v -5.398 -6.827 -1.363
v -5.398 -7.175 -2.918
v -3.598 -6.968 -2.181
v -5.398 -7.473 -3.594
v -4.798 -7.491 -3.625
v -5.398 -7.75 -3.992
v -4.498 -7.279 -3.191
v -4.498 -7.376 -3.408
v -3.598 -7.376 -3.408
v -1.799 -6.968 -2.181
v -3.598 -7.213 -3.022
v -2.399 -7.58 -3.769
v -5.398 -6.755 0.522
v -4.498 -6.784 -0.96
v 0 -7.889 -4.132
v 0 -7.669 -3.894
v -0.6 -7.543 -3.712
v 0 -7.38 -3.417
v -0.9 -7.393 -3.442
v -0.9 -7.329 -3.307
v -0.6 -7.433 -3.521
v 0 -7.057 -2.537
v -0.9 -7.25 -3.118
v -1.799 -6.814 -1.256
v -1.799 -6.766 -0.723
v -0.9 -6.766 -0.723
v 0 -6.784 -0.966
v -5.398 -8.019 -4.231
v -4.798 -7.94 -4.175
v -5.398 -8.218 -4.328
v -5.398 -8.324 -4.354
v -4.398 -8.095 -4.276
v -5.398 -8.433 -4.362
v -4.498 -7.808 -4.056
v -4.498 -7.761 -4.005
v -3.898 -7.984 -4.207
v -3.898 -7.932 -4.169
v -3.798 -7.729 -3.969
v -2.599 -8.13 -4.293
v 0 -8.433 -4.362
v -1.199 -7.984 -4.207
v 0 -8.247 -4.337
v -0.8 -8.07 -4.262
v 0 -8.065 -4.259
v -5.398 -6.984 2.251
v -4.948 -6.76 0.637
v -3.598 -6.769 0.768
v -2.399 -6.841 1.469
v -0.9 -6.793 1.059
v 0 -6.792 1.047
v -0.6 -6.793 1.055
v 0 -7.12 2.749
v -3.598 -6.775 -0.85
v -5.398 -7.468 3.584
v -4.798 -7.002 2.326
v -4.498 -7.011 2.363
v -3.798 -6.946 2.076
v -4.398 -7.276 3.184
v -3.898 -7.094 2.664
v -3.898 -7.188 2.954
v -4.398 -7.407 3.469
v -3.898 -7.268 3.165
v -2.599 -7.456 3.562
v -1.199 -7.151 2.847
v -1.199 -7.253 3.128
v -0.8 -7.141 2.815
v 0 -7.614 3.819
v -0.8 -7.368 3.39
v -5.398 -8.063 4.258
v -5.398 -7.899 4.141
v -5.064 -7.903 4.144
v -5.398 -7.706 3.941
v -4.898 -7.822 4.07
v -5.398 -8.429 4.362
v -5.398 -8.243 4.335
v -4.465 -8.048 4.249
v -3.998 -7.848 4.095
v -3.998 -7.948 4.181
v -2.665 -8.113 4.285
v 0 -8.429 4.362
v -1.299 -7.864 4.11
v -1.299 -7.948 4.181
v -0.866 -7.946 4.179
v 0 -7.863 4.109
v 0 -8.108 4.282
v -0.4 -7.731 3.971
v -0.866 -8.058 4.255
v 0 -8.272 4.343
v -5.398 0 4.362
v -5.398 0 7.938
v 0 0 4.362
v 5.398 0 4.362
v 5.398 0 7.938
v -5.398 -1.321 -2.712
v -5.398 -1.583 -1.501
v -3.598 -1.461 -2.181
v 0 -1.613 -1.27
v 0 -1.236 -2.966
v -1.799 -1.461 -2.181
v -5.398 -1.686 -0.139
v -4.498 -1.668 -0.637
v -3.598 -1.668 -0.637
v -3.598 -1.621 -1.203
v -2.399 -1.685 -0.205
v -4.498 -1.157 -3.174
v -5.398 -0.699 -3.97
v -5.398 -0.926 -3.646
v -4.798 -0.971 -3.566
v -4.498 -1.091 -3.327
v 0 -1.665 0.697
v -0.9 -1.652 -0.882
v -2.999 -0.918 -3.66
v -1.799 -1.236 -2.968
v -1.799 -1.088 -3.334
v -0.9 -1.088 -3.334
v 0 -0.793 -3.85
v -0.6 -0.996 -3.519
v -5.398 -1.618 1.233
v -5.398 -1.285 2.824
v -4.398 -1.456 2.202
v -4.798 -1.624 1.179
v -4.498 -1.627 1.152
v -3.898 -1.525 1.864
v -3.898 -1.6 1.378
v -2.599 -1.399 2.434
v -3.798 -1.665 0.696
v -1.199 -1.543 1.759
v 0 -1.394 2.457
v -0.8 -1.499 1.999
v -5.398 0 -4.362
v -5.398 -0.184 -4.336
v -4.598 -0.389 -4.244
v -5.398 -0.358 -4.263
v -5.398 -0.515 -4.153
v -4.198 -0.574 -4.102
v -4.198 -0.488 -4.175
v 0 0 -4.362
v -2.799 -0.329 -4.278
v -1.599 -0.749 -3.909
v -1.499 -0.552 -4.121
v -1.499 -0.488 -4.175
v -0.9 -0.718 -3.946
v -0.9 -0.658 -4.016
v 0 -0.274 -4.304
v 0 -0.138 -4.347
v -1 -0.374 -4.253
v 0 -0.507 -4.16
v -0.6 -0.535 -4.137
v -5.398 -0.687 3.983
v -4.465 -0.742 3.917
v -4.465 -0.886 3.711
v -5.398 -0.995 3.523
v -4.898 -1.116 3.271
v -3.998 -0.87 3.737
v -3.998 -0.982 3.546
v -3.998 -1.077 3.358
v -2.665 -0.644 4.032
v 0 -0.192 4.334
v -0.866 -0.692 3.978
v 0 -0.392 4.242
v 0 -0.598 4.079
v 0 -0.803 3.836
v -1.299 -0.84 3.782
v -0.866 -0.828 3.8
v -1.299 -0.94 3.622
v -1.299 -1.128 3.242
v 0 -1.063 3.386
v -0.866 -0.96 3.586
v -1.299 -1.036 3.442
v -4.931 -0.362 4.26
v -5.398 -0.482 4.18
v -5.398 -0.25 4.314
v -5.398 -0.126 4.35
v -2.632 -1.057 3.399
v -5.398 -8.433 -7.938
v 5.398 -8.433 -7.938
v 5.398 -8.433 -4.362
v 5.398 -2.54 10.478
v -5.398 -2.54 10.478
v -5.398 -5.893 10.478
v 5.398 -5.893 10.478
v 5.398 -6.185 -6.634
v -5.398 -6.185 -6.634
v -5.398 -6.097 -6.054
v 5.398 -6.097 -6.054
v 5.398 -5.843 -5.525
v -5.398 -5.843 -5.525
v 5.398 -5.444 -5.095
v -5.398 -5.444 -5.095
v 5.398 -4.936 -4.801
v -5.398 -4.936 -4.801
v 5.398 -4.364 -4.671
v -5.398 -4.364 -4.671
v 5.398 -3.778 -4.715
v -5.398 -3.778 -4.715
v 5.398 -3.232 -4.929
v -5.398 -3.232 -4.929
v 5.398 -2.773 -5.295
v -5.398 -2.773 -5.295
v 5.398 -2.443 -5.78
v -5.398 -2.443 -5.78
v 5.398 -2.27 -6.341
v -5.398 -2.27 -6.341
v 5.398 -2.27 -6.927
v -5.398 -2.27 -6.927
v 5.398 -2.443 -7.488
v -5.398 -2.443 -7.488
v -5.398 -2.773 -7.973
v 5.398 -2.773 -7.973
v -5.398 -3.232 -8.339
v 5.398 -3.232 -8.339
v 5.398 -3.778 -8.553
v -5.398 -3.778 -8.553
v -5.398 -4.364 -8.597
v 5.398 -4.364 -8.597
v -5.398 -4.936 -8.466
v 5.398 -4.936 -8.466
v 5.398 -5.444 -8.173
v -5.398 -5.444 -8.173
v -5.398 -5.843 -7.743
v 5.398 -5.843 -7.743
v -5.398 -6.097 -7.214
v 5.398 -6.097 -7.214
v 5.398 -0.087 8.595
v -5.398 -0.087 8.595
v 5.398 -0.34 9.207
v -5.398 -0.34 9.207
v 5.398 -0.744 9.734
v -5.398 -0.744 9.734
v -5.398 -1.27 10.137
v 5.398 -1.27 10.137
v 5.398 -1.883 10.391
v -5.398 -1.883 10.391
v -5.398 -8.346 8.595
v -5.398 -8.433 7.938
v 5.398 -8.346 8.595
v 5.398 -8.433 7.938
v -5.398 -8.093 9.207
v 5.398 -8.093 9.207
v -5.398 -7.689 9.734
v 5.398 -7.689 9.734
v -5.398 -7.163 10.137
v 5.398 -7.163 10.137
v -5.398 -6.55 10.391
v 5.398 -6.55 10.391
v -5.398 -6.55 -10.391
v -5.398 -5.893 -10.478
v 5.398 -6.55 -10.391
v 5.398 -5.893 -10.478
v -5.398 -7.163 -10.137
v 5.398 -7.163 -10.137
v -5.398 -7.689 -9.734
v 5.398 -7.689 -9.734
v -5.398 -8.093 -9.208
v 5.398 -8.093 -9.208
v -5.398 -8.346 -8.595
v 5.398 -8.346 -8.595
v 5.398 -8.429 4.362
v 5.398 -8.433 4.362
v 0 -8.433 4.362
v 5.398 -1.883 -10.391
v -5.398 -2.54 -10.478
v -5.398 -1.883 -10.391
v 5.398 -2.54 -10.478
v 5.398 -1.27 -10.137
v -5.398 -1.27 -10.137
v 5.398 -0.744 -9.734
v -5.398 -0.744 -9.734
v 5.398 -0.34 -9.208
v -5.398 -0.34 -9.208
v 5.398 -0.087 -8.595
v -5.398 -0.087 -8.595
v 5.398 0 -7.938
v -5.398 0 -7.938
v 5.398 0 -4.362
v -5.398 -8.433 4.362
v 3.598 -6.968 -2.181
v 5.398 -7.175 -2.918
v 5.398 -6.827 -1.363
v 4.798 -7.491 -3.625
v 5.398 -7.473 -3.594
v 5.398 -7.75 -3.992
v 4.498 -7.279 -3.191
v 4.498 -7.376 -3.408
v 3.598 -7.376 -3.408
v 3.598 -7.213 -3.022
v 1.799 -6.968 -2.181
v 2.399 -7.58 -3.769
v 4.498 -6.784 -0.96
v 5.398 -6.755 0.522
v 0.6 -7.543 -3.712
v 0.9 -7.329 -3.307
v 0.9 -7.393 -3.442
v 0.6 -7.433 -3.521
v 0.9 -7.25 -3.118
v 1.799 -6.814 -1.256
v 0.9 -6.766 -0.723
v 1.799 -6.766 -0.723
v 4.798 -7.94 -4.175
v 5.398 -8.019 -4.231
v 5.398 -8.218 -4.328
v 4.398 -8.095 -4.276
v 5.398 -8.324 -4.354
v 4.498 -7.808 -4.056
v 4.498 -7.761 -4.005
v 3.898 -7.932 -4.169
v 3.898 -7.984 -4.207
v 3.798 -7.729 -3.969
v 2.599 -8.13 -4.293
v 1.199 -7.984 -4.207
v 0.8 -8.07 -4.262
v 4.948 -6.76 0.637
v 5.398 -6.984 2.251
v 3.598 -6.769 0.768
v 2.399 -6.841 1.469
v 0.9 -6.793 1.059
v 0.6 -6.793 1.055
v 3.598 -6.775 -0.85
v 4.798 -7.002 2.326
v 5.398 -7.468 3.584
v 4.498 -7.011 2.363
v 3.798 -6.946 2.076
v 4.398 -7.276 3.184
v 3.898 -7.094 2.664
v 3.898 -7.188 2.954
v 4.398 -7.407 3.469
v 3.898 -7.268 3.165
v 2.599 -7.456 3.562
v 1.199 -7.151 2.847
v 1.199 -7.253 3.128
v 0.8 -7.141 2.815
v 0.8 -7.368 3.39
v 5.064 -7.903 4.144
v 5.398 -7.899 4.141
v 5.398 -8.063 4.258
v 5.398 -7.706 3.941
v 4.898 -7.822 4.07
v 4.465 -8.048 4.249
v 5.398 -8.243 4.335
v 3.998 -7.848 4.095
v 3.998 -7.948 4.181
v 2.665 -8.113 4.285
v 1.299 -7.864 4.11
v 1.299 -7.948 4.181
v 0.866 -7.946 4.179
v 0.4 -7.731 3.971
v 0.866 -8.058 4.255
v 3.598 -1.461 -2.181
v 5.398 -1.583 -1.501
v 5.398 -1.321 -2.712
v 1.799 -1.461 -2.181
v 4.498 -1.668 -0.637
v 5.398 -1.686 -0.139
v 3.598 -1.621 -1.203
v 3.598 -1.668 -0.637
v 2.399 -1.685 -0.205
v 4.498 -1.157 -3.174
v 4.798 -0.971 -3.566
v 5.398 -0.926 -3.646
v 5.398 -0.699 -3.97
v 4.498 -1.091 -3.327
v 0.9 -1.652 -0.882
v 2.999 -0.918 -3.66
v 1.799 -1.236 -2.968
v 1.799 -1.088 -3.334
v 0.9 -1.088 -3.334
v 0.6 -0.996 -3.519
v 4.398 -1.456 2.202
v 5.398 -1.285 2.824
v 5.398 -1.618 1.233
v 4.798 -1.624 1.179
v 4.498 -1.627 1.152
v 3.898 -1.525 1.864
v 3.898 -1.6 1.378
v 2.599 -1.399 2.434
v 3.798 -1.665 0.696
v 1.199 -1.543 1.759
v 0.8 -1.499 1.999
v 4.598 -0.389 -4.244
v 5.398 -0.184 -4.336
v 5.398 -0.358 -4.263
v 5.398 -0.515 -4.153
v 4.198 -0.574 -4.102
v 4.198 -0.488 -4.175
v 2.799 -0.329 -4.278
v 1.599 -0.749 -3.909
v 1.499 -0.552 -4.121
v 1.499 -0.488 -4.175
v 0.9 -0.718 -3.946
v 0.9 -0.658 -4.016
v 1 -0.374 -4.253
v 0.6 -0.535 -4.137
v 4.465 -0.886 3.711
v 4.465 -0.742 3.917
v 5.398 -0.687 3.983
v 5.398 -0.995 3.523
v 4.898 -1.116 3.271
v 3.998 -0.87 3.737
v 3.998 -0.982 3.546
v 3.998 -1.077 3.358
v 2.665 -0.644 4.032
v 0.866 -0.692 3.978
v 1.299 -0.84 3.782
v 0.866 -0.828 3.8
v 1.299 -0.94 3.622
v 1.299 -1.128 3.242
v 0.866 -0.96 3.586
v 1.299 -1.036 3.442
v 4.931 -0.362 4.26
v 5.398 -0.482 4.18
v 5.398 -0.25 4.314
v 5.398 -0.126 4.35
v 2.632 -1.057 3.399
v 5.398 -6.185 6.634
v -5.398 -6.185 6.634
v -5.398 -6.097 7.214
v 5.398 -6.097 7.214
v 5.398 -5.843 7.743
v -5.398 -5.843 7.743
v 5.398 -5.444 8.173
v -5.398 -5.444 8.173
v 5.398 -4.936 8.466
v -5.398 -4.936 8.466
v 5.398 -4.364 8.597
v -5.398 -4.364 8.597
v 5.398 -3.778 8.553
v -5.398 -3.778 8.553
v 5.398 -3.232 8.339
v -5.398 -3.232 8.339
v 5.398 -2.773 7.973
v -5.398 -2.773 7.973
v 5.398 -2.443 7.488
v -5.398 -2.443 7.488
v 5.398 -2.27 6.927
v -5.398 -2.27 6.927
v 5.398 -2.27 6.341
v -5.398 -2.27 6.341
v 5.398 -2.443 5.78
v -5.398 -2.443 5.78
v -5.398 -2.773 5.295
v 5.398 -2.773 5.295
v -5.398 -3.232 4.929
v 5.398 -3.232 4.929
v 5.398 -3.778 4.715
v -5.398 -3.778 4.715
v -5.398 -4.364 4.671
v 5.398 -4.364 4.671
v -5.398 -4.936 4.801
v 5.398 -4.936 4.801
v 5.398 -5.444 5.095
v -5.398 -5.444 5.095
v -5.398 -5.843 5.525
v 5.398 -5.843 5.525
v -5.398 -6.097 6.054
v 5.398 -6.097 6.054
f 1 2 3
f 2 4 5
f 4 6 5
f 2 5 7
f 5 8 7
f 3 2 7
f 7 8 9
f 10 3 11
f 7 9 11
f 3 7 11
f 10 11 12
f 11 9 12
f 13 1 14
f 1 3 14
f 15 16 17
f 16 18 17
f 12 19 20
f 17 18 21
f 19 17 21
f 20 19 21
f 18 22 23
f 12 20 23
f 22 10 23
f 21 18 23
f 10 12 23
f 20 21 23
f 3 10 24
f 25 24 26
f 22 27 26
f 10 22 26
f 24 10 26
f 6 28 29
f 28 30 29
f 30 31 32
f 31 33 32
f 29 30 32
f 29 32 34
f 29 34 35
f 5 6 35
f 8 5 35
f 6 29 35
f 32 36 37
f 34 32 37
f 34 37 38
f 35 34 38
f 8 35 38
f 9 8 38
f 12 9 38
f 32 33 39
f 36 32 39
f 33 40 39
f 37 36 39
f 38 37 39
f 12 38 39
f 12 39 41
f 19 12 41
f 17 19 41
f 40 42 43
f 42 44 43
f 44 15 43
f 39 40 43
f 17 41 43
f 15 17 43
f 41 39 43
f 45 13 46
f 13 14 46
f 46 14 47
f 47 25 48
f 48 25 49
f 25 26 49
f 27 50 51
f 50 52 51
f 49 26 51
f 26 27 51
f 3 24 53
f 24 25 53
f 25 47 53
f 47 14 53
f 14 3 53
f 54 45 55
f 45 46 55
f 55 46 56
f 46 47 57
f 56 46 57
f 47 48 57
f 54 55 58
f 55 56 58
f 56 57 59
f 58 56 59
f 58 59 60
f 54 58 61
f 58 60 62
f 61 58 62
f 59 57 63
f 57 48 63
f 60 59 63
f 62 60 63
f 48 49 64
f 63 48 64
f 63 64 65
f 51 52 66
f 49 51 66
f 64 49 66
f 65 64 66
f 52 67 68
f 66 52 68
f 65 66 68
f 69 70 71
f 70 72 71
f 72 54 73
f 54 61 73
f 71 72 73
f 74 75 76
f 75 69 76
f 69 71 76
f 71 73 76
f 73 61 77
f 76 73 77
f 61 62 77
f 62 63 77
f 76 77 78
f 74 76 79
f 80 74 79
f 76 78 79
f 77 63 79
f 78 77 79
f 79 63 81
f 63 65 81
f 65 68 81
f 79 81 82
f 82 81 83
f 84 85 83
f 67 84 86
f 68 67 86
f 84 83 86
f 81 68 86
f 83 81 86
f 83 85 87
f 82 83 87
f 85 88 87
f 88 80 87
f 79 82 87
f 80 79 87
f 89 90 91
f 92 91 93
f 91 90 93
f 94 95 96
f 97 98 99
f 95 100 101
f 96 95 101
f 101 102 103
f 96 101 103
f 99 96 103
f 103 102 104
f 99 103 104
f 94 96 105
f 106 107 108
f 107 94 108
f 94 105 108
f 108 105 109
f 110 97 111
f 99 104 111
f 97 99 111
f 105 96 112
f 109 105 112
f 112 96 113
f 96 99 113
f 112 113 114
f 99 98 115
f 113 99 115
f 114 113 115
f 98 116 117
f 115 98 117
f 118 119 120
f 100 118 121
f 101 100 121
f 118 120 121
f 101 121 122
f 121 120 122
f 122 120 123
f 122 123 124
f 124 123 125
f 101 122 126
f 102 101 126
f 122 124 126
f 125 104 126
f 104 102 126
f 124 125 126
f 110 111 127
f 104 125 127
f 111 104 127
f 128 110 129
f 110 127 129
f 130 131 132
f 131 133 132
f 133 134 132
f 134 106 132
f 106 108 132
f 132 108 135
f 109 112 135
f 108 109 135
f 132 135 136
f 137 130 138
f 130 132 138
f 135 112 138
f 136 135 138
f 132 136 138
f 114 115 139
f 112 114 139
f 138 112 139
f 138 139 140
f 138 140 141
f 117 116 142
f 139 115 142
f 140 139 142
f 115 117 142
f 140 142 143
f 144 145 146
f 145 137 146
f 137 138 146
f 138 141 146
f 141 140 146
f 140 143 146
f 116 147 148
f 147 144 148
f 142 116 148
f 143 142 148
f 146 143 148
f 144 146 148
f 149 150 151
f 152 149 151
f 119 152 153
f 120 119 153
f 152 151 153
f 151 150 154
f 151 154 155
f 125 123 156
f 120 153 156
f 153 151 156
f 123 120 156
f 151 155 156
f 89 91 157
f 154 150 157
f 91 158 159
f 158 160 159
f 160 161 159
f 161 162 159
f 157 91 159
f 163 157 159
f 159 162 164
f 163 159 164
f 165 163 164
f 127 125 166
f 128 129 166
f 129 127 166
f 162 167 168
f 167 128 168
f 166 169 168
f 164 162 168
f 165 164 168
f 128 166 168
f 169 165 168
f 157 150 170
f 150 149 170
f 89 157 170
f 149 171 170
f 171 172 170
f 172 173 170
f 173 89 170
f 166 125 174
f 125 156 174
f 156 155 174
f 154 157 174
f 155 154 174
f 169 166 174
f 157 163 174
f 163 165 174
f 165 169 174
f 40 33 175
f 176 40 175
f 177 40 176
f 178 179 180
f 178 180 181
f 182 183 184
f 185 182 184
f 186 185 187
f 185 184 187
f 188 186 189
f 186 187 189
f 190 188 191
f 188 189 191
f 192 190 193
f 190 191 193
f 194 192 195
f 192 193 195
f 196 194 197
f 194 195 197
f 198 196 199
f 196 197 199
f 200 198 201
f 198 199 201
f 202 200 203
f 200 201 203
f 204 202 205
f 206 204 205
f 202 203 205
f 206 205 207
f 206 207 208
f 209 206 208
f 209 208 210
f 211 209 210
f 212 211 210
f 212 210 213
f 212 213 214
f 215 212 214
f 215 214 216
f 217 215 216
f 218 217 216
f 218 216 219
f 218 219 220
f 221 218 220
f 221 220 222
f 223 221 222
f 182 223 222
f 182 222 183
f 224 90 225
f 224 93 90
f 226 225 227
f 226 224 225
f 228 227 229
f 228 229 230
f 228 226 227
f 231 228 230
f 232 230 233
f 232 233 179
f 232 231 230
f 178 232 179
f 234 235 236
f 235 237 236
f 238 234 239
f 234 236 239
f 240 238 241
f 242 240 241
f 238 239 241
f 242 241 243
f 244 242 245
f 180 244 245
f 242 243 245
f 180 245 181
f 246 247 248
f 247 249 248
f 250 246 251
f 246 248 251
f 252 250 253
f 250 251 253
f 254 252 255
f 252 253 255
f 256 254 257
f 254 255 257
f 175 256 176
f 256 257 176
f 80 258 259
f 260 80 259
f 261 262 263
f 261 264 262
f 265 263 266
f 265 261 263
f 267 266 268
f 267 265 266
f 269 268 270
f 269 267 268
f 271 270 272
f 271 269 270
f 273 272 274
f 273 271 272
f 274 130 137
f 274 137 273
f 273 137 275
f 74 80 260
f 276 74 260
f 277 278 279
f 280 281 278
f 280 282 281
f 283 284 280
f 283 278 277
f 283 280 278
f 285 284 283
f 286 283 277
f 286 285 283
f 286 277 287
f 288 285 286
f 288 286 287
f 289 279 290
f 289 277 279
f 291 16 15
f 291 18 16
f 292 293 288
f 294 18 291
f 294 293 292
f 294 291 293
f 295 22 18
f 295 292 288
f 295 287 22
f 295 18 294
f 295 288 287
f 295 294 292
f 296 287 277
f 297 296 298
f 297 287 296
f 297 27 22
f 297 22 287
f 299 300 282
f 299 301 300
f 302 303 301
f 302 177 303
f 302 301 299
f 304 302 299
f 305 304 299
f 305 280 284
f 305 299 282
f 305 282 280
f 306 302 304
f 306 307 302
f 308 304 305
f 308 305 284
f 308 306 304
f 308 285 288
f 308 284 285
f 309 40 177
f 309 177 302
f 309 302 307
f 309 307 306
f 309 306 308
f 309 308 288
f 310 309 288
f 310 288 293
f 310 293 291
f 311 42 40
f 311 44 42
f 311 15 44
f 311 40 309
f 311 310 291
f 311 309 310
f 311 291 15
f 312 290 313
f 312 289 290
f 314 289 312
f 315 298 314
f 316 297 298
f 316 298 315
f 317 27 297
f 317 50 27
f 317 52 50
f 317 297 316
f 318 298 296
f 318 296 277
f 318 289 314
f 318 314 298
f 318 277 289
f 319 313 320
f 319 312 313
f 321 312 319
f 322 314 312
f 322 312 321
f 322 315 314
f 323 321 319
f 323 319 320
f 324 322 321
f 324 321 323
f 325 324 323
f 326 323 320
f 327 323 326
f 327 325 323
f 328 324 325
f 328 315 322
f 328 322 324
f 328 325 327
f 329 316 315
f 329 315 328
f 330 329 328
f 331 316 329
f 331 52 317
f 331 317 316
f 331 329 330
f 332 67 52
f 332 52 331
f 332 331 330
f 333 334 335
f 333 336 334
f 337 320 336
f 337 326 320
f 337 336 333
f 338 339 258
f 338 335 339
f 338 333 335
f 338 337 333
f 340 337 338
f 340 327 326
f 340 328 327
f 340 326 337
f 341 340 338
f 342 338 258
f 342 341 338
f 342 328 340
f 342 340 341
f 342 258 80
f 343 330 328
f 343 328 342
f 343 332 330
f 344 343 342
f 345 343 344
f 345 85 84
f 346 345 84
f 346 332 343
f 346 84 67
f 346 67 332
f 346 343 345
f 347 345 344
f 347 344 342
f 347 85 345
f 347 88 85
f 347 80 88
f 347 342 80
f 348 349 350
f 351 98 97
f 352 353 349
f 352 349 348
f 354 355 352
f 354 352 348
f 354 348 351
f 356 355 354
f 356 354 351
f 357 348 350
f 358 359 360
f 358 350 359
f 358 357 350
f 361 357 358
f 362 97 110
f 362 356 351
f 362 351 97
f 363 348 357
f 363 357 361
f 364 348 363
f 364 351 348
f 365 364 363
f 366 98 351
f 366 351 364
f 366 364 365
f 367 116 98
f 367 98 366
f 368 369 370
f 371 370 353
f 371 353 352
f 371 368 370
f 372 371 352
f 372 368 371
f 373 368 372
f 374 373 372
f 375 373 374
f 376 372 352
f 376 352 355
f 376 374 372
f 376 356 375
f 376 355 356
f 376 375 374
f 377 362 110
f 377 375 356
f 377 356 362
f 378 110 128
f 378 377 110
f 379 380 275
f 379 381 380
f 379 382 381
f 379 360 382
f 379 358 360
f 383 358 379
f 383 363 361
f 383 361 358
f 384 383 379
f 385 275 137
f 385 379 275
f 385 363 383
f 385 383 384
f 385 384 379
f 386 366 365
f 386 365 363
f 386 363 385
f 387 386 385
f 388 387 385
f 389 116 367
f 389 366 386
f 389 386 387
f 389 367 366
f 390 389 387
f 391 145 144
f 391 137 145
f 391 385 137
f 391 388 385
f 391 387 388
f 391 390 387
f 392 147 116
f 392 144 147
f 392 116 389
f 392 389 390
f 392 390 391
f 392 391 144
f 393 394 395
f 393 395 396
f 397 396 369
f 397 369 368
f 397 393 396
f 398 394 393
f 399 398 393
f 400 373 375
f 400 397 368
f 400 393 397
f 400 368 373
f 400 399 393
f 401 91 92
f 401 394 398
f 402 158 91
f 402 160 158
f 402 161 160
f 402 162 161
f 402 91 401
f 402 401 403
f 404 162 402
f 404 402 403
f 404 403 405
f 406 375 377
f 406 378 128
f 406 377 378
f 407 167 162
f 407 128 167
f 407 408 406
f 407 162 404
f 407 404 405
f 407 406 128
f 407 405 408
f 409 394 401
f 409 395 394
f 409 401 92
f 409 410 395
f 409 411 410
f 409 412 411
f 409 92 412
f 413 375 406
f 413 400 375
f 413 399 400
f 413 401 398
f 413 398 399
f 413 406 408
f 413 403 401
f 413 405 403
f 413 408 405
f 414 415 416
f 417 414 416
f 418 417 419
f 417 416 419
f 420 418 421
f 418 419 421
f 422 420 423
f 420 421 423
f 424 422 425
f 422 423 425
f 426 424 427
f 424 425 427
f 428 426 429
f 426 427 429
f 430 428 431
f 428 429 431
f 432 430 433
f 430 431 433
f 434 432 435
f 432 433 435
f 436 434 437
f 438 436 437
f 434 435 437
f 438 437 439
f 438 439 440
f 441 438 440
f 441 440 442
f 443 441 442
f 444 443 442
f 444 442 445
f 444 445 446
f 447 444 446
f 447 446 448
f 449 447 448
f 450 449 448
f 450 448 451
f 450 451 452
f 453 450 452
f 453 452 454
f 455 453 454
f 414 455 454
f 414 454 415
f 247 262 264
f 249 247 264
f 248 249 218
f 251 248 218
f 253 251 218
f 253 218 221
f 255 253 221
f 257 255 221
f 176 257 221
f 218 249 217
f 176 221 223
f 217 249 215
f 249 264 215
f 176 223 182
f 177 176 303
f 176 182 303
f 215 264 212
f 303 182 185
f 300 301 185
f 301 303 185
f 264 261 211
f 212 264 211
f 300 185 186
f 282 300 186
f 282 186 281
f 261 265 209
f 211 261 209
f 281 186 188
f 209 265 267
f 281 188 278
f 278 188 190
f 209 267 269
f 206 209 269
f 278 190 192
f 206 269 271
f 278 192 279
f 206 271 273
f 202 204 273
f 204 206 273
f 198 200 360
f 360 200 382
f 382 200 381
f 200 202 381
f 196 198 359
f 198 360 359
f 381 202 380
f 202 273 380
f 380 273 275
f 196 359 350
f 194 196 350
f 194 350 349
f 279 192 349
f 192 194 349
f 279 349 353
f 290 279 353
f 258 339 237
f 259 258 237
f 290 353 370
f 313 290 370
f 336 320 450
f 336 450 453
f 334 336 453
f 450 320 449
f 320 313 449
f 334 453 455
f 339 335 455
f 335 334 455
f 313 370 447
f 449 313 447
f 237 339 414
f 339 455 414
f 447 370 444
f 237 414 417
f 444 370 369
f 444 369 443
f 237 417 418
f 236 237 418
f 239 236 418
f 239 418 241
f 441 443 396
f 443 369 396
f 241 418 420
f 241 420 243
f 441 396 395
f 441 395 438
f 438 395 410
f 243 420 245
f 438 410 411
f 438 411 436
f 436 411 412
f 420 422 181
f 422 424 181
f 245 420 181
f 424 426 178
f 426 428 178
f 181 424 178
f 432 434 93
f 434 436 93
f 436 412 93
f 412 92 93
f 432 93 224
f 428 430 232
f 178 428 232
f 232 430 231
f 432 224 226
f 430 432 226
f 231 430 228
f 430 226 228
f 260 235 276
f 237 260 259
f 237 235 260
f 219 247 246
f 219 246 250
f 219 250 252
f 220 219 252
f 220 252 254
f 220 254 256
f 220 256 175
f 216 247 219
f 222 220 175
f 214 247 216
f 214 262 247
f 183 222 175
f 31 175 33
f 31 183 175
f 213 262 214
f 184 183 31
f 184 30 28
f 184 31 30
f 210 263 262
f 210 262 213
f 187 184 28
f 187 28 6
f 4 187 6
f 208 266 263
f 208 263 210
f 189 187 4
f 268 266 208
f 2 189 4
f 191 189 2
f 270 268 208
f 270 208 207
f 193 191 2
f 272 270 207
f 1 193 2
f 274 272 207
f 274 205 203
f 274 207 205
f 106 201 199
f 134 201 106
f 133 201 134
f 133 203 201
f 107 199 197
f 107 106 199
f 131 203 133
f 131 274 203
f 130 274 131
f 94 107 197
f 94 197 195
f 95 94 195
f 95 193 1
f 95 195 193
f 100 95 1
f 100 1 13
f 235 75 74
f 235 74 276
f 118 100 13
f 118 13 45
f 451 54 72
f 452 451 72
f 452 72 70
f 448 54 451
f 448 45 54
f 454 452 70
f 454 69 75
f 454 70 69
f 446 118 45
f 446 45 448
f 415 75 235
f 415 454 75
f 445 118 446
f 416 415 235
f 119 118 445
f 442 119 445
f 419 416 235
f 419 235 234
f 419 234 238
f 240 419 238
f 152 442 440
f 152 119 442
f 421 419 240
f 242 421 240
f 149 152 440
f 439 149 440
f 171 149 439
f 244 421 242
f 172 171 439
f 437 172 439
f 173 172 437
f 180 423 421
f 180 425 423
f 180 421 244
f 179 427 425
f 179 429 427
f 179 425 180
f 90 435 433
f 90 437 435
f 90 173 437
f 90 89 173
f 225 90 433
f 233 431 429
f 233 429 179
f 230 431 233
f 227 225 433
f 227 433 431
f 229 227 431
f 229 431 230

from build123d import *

# Parameters (mm, degrees)
F0_W          = 10.795
F0_H          = 20.955
F1_DEPTH      = 8.4328
F2_R          = 1.9685
F3_DEPTH      = 26.924
F4_DEPTH      = 25.4
F5_R          = 2.54
F7_DEPTH      = 25.4
F7_DEPTH_BACK = 25.4


with BuildPart() as f1:
    # F0 (on Front) → F1 (new body)
    with BuildSketch(Plane.XZ):
        Rectangle(F0_W, F0_H)
    extrude(amount=F1_DEPTH)

    # F2 (on face) → F3 (cut)
    with BuildSketch(Plane(origin=(-5.3975, 0, 0), x_dir=(0, -1, 0), z_dir=(-1, 0, 0))):
        with Locations((4.2164, 6.6338940524)):
            Circle(F2_R)
    extrude(amount=-F3_DEPTH, mode=Mode.SUBTRACT)

    # F2 (on face) → F4 (cut)
    with BuildSketch(Plane(origin=(-5.3975, 0, 0), x_dir=(0, -1, 0), z_dir=(-1, 0, 0))):
        with Locations((4.2164, 6.6338940524)):
            Circle(F2_R)
        with Locations((4.2164, -6.6338940524)):
            Circle(F2_R)
    extrude(amount=-F4_DEPTH, mode=Mode.SUBTRACT)

    # F5
    f5_edges = [f1.edges().sort_by_distance(p)[0] for p in [
        (0, 0, 10.4775),
        (0, -8.4328, 10.4775),
        (0, 0, -10.4775),
        (0, -8.4328, -10.4775),
    ]]
    fillet(f5_edges, radius=F5_R)

    # F6 (on Right) → F7 (cut, two sides)
    with BuildSketch(Plane.YZ) as f7_sk:
        with BuildLine():
            add(Edge.make_bspline(
                [(0, 4.3619680218), (-2.9210566391, 4.3619680218), (-1.4605283196, -2.1809840109), (0, -8.7239360437), (1.4605283196, -2.1809840109), (2.9210566391, 4.3619680218), (0, 4.3619680218)],
                knots=[0, 0, 0, 2.0943951024, 2.0943951024, 4.1887902048, 4.1887902048, 6.2831853072, 6.2831853072, 6.2831853072], degree=2, weights=[1, 0.5, 1, 0.5, 1, 0.5, 1]))
        make_face()
        with BuildLine():
            add(Edge.make_bspline(
                [(-8.4288967773, 4.3619680218), (-11.3499534165, 4.3619680218), (-9.8894250969, -2.1809840109), (-8.4288967773, -8.7239360437), (-6.9683684578, -2.1809840109), (-5.5078401382, 4.3619680218), (-8.4288967773, 4.3619680218)],
                knots=[0, 0, 0, 2.0943951024, 2.0943951024, 4.1887902048, 4.1887902048, 6.2831853072, 6.2831853072, 6.2831853072], degree=2, weights=[1, 0.5, 1, 0.5, 1, 0.5, 1]))
        make_face()
    extrude(amount=-F7_DEPTH, mode=Mode.SUBTRACT)
    extrude(f7_sk.sketch, amount=F7_DEPTH_BACK, mode=Mode.SUBTRACT)


solid = f1.part
